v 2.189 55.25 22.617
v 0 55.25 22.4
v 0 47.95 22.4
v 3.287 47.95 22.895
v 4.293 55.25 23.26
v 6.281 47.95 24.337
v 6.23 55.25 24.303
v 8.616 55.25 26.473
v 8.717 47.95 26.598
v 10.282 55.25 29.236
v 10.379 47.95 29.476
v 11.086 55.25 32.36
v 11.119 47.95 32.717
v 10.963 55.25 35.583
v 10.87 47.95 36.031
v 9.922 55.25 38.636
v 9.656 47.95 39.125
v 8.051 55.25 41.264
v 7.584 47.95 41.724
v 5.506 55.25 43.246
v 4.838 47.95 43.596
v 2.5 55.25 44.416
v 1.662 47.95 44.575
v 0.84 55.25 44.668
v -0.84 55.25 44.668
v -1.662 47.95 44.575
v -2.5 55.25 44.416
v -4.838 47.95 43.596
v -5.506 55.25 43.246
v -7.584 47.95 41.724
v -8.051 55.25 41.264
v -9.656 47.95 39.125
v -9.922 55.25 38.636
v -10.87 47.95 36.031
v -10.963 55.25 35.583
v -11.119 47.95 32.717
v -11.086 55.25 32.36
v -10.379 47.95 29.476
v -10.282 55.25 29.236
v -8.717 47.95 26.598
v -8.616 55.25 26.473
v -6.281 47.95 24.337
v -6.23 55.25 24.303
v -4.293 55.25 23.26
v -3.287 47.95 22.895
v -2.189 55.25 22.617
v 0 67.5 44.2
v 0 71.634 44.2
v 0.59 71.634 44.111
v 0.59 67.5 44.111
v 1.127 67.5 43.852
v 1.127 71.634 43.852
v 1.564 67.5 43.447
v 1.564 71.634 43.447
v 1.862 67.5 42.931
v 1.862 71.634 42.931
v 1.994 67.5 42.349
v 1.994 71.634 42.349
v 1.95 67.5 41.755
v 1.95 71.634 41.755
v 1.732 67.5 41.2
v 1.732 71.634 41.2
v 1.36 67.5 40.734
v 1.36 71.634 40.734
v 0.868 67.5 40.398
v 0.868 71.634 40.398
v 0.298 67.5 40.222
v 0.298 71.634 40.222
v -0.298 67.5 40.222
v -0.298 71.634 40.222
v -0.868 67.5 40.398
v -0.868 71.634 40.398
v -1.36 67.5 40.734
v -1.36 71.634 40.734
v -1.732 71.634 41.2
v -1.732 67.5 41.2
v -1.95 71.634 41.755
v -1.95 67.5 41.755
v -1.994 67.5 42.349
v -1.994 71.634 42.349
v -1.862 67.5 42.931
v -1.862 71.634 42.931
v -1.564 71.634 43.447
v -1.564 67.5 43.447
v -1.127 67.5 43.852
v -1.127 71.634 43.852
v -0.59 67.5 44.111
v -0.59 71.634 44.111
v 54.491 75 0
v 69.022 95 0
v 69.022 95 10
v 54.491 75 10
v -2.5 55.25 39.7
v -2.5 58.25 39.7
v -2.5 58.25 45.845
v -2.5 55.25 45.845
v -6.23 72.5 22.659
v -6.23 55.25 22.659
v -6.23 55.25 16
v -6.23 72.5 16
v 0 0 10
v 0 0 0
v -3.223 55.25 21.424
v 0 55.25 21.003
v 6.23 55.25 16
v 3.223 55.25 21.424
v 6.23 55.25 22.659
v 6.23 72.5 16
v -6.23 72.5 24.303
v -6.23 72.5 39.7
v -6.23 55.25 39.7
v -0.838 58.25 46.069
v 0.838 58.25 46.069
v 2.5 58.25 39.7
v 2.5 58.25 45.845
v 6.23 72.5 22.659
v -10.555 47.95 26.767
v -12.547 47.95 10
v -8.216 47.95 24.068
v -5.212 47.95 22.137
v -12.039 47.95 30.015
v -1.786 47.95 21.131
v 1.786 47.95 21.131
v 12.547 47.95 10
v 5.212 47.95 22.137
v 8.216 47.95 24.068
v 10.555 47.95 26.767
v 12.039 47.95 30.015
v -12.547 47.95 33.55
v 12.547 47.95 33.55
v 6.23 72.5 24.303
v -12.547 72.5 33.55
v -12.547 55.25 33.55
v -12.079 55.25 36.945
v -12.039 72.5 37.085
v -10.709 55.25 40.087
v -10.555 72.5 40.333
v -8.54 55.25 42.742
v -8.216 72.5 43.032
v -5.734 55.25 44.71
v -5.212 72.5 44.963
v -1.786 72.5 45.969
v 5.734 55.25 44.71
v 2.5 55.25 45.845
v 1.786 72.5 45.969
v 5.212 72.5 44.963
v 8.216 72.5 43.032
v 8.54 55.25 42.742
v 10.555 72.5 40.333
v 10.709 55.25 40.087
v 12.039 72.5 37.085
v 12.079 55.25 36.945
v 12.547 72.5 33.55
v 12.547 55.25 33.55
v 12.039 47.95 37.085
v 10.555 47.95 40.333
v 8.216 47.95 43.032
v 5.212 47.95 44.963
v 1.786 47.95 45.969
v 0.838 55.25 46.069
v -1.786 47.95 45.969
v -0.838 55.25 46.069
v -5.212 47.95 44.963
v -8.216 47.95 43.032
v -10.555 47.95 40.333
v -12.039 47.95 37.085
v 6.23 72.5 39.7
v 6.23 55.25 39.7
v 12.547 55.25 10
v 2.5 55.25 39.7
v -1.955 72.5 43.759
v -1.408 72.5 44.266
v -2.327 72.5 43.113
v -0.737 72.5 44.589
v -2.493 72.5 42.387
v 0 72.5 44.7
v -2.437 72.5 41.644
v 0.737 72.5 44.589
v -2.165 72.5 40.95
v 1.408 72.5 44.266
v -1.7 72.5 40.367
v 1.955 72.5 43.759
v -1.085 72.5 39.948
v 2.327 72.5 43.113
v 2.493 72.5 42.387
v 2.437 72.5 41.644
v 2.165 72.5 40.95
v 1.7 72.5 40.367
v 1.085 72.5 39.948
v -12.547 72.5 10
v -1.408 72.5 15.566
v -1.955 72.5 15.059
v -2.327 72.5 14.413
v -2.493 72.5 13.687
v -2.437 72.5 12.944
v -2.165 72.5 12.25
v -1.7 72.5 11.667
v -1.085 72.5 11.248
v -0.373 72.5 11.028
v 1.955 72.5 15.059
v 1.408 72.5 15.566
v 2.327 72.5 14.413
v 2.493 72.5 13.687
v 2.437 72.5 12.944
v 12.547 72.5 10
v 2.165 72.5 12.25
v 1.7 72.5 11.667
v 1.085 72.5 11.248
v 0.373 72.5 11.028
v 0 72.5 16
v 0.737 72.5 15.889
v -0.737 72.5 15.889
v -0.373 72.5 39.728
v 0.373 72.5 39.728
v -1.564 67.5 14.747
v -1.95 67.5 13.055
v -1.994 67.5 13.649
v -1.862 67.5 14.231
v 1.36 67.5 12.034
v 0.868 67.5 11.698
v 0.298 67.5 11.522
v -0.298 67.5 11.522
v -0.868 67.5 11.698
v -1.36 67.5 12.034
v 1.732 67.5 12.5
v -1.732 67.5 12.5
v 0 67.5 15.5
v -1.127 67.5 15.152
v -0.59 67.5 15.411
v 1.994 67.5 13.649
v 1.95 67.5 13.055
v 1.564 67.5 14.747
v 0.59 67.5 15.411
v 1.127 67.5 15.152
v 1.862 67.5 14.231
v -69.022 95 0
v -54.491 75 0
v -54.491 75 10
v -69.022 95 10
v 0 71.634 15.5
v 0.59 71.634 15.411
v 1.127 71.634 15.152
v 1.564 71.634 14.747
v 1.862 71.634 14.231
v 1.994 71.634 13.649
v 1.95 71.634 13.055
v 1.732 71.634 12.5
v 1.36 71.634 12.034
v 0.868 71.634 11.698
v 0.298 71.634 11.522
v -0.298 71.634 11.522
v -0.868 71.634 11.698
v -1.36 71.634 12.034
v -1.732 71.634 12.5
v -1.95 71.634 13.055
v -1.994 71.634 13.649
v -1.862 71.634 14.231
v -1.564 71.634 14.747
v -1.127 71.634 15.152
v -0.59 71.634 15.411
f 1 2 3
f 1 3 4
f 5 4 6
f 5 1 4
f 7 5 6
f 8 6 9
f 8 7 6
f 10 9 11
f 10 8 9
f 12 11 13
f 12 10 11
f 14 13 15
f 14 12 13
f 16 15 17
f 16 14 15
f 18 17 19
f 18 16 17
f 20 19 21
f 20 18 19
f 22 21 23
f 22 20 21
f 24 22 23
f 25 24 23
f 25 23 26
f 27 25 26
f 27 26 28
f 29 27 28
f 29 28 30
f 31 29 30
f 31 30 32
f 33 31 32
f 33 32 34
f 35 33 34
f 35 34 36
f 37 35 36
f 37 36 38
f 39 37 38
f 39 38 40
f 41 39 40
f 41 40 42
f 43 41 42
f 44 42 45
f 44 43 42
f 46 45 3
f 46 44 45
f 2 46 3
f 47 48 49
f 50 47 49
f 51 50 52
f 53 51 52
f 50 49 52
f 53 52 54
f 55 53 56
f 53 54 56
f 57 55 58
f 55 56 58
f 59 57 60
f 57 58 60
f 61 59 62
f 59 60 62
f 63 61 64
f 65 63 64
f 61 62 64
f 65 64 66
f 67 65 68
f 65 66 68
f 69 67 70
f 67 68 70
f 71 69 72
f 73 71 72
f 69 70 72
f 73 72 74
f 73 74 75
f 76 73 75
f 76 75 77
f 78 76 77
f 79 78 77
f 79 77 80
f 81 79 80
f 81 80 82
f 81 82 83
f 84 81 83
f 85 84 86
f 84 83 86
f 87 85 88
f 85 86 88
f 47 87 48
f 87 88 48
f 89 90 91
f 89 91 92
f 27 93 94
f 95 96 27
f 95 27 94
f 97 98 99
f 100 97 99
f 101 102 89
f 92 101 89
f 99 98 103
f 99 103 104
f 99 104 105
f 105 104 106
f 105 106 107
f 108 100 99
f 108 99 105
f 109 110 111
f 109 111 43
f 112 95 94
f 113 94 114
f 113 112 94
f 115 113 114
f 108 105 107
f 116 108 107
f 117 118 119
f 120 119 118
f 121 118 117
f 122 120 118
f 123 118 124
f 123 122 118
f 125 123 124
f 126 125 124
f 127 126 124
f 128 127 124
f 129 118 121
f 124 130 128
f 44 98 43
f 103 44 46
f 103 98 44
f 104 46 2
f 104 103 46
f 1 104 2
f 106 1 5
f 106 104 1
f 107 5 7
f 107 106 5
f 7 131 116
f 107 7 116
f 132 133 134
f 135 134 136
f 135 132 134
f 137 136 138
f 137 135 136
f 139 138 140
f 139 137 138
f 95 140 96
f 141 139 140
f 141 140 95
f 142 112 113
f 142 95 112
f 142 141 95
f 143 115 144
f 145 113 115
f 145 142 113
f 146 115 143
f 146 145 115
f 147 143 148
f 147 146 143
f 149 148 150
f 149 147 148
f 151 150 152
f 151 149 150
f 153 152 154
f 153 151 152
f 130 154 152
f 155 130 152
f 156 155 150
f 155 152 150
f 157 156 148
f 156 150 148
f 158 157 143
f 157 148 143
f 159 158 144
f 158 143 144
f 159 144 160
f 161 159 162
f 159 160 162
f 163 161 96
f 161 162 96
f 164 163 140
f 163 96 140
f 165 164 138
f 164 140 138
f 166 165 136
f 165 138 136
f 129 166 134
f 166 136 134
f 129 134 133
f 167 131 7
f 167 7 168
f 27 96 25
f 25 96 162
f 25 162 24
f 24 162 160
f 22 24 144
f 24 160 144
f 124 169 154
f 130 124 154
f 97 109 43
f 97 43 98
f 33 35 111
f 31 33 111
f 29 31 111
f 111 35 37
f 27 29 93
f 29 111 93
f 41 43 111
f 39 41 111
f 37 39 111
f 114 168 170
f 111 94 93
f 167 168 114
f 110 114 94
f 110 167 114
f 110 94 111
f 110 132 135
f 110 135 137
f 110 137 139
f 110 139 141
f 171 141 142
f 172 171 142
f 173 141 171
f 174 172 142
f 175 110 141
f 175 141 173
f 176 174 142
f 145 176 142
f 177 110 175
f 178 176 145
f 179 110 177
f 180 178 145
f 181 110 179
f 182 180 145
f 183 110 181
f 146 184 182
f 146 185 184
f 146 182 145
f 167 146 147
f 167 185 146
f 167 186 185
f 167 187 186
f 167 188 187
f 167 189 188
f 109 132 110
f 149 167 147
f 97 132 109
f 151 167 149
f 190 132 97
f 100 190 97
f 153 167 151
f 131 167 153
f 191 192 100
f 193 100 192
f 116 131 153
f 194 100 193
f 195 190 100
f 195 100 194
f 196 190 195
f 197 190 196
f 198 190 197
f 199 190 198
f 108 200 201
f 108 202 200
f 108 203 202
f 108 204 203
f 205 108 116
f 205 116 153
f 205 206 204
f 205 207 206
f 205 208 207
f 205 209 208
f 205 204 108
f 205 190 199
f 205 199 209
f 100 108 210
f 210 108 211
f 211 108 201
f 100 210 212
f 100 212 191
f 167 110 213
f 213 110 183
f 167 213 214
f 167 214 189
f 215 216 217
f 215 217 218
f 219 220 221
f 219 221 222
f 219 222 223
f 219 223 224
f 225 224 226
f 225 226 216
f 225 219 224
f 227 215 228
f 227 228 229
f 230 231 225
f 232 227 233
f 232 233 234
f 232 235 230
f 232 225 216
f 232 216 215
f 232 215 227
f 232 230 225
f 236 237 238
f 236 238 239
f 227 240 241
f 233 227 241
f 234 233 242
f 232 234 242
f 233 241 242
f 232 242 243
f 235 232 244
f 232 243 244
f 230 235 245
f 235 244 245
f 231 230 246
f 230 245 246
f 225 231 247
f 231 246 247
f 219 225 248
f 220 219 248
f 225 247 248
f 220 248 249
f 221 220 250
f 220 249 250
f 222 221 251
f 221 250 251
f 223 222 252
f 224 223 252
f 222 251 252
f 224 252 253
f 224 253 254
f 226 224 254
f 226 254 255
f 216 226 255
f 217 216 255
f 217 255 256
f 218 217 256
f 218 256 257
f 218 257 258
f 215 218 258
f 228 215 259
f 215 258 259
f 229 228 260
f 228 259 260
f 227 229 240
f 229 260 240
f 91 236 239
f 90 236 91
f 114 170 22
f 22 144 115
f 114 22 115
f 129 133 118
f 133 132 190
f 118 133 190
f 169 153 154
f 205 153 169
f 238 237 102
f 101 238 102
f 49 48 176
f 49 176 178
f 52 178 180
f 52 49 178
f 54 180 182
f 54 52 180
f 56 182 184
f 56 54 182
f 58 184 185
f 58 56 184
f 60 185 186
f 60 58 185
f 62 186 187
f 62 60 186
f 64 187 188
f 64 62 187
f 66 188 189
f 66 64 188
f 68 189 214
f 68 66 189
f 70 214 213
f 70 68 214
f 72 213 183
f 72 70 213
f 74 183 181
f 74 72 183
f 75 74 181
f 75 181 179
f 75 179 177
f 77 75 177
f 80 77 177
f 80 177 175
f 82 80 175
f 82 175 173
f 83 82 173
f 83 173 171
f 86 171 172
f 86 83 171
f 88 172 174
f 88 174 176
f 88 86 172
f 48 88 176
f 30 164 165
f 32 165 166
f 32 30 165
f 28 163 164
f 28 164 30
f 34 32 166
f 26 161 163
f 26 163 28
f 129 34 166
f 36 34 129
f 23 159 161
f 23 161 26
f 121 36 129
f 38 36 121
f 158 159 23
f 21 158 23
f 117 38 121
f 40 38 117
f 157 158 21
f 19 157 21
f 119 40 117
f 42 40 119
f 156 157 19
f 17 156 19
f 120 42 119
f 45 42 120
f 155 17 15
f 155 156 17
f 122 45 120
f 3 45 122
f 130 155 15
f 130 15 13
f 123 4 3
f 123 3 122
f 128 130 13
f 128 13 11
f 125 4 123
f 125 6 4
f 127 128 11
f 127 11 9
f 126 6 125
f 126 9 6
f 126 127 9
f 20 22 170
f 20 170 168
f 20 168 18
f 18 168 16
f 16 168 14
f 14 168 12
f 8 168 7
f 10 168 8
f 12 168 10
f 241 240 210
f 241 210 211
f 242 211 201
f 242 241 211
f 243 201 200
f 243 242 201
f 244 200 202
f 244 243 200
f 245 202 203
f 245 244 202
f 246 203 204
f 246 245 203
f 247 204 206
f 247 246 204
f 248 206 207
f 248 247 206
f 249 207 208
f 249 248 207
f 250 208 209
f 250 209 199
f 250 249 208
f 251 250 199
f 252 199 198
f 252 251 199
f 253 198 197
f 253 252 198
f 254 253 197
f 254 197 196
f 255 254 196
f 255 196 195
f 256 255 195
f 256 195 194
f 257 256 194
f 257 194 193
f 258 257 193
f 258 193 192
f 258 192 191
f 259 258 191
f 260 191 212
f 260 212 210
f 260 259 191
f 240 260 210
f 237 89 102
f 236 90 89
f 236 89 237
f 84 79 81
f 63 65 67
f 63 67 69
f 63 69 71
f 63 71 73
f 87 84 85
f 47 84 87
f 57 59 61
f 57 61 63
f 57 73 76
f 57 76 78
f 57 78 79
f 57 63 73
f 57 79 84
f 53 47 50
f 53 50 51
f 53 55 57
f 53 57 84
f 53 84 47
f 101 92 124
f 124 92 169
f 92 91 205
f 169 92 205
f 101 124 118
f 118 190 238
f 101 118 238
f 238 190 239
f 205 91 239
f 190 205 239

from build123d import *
from OCP.BRepFilletAPI import BRepFilletAPI_MakeChamfer

# Parameters (mm, degrees)
BOSS_EXTRUDE1_DEPTH      = 10
SKETCH4_W                = 12.46
SKETCH4_H                = 17.25
BOSS_EXTRUDE3_DEPTH      = 6
BOSS_EXTRUDE6_DEPTH      = 7.3
BOSS_EXTRUDE6_DEPTH_BACK = 17.25
SKETCH8_R                = 12.546781182
SKETCH8_R_2              = 11.15
BOSS_EXTRUDE4_DEPTH      = 17.25
SKETCH6_R                = 2
CUT_EXTRUDE1_DEPTH       = 5
CHAMFER1_SIZE            = 0.5
CHAMFER1_SIZE_2          = 0.866025404
BOSS_EXTRUDE2_DEPTH      = 10
SKETCH10_W               = 12.46
SKETCH10_H               = 23.7
CUT_EXTRUDE3_DEPTH       = 17.25
CUT_EXTRUDE4_REACH       = 128.15
SKETCH11_W               = 5
SKETCH11_H               = 3
BOSS_EXTRUDE7_START      = -7.3
BOSS_EXTRUDE7_DEPTH      = 7.3


with BuildPart() as part:
    # Sketch1 → Boss-Extrude1 (new body)
    with BuildSketch(Plane.XY):
        Polygon((0, 0), (54.4906896, 75), (-54.4906896, 75), align=None)
    extrude(amount=BOSS_EXTRUDE1_DEPTH)

    # Sketch4 → Boss-Extrude3 (add)
    with BuildSketch(Plane.XY.offset(10)):
        with Locations((0, 63.875025481)):
            Rectangle(SKETCH4_W, SKETCH4_H)
    extrude(amount=BOSS_EXTRUDE3_DEPTH)



with BuildPart() as body_2:
    # Sketch8 → Boss-Extrude6 (new, two sides: drawn at the far end of the back side and taken through both)
    with BuildSketch(Plane(origin=(0, 55.250025481, 0), x_dir=(-1, 0, 0), z_dir=(0, -1, 0)).offset(-BOSS_EXTRUDE6_DEPTH_BACK)):
        with Locations(Location((0, -33.55, 0), (0, 0, 90))):
            Circle(SKETCH8_R)
        with Locations(Location((0, -33.55, 0), (0, 0, 90))):
            Circle(SKETCH8_R_2, mode=Mode.SUBTRACT)
    extrude(amount=BOSS_EXTRUDE6_DEPTH + BOSS_EXTRUDE6_DEPTH_BACK)


with BuildPart() as part_1:
    add(part.part)

    add(body_2.part)  # Boss-Extrude4 merges body 2
    # Sketch5 → Boss-Extrude4 (add)
    with BuildSketch(Plane(origin=(0, 72.500025481, 0), x_dir=(1, 0, 0), z_dir=(0, 1, 0))):
        with BuildLine():
            Line((12.546781182, -33.55), (12.546781182, -10))
            Line((12.546781182, -10), (6.23, -10))
            Line((6.23, -10), (6.23, -39.7))
            Line((6.23, -39.7), (-6.23, -39.7))
            Line((-6.23, -39.7), (-6.23, -10))
            Line((-6.23, -10), (-12.546781182, -10))
            Line((-12.546781182, -10), (-12.546781182, -33.55))
            ThreePointArc((-12.546781182, -33.55), (0, -46.096781182), (12.546781182, -33.55))
        make_face()
    extrude(amount=-BOSS_EXTRUDE4_DEPTH)

    # Sketch6 → Cut-Extrude1 (cut)
    with BuildSketch(Plane(origin=(0, 72.500025481, 0), x_dir=(1, 0, 0), z_dir=(0, 1, 0))):
        with Locations(Location((0, -13.5, 0), (0, 0, 270))):
            Circle(SKETCH6_R)
        with Locations(Location((0, -42.2, 0), (0, 0, 270))):
            Circle(SKETCH6_R)
    extrude(amount=-CUT_EXTRUDE1_DEPTH, mode=Mode.SUBTRACT)

    # Chamfer1
    chamfer1_edges_1 = [part_1.edges().sort_by_distance(p)[0] for p in [
        (0, 72.500025481, 11.5),
    ]]
    chamfer1_side_1 = [part_1.faces().sort_by_distance(p)[0] for p in [
        (0, 72.500025481, 11.49),
    ]]
    chamfer1_edges_2 = [part_1.edges().sort_by_distance(p)[0] for p in [
        (0, 72.500025481, 40.2),
    ]]
    chamfer1_side_2 = [part_1.faces().sort_by_distance(p)[0] for p in [
        (0, 72.500025481, 40.19),
    ]]
    chamfer1 = BRepFilletAPI_MakeChamfer(part_1.part.solid().wrapped)
    for e in chamfer1_edges_1:
        chamfer1.Add(CHAMFER1_SIZE - 0.0001, CHAMFER1_SIZE_2 - 0.0001, e.wrapped, chamfer1_side_1[0].wrapped)
    for e in chamfer1_edges_2:
        chamfer1.Add(CHAMFER1_SIZE - 0.0001, CHAMFER1_SIZE_2 - 0.0001, e.wrapped, chamfer1_side_2[0].wrapped)
    add(Compound.cast(chamfer1.Shape()), mode=Mode.REPLACE)  # a hair under: the kernel refuses the full size

    # Sketch2 → Boss-Extrude2 (add)
    with BuildSketch(Plane.XY):
        Polygon((-54.4906896, 75), (-69.021540161, 95), (69.021540161, 95), (54.4906896, 75), align=None)
    extrude(amount=BOSS_EXTRUDE2_DEPTH)

    # Sketch10 → Cut-Extrude3 (cut)
    with BuildSketch(Plane(origin=(0, 72.500025481, 0), x_dir=(1, 0, 0), z_dir=(0, 1, 0))):
        with Locations((0, -27.85)):
            Rectangle(SKETCH10_W, SKETCH10_H)
    extrude(amount=-CUT_EXTRUDE3_DEPTH, mode=Mode.SUBTRACT)

    # Sketch11 → Cut-Extrude4 (cut, up to next)
    with BuildSketch(Plane.XY.offset(46.096781182), mode=Mode.PRIVATE) as cut_extrude4_sk1:
        with Locations((0, 56.750025481)):
            Rectangle(SKETCH11_W, SKETCH11_H)
    cut_extrude4_tool1 = extrude(cut_extrude4_sk1.sketch, amount=-CUT_EXTRUDE4_REACH, mode=Mode.PRIVATE) & part_1.part
    add(cut_extrude4_tool1.solids().sort_by_distance((0, 56.750025, 46.096781))[0], mode=Mode.SUBTRACT)

    # Sketch13 → Boss-Extrude7 (add)
    with BuildSketch(Plane.XZ.offset(-47.950025481).offset(BOSS_EXTRUDE7_START)):
        with BuildLine():
            Line((-12.546781182, 33.55), (-12.546781182, 10))
            Line((-12.546781182, 10), (12.546781182, 10))
            Line((12.546781182, 10), (12.546781182, 33.55))
            ThreePointArc((12.546781182, 33.55), (0, 21.003218818), (-12.546781182, 33.55))
        make_face()
    extrude(amount=BOSS_EXTRUDE7_DEPTH)


solid = part_1.part
